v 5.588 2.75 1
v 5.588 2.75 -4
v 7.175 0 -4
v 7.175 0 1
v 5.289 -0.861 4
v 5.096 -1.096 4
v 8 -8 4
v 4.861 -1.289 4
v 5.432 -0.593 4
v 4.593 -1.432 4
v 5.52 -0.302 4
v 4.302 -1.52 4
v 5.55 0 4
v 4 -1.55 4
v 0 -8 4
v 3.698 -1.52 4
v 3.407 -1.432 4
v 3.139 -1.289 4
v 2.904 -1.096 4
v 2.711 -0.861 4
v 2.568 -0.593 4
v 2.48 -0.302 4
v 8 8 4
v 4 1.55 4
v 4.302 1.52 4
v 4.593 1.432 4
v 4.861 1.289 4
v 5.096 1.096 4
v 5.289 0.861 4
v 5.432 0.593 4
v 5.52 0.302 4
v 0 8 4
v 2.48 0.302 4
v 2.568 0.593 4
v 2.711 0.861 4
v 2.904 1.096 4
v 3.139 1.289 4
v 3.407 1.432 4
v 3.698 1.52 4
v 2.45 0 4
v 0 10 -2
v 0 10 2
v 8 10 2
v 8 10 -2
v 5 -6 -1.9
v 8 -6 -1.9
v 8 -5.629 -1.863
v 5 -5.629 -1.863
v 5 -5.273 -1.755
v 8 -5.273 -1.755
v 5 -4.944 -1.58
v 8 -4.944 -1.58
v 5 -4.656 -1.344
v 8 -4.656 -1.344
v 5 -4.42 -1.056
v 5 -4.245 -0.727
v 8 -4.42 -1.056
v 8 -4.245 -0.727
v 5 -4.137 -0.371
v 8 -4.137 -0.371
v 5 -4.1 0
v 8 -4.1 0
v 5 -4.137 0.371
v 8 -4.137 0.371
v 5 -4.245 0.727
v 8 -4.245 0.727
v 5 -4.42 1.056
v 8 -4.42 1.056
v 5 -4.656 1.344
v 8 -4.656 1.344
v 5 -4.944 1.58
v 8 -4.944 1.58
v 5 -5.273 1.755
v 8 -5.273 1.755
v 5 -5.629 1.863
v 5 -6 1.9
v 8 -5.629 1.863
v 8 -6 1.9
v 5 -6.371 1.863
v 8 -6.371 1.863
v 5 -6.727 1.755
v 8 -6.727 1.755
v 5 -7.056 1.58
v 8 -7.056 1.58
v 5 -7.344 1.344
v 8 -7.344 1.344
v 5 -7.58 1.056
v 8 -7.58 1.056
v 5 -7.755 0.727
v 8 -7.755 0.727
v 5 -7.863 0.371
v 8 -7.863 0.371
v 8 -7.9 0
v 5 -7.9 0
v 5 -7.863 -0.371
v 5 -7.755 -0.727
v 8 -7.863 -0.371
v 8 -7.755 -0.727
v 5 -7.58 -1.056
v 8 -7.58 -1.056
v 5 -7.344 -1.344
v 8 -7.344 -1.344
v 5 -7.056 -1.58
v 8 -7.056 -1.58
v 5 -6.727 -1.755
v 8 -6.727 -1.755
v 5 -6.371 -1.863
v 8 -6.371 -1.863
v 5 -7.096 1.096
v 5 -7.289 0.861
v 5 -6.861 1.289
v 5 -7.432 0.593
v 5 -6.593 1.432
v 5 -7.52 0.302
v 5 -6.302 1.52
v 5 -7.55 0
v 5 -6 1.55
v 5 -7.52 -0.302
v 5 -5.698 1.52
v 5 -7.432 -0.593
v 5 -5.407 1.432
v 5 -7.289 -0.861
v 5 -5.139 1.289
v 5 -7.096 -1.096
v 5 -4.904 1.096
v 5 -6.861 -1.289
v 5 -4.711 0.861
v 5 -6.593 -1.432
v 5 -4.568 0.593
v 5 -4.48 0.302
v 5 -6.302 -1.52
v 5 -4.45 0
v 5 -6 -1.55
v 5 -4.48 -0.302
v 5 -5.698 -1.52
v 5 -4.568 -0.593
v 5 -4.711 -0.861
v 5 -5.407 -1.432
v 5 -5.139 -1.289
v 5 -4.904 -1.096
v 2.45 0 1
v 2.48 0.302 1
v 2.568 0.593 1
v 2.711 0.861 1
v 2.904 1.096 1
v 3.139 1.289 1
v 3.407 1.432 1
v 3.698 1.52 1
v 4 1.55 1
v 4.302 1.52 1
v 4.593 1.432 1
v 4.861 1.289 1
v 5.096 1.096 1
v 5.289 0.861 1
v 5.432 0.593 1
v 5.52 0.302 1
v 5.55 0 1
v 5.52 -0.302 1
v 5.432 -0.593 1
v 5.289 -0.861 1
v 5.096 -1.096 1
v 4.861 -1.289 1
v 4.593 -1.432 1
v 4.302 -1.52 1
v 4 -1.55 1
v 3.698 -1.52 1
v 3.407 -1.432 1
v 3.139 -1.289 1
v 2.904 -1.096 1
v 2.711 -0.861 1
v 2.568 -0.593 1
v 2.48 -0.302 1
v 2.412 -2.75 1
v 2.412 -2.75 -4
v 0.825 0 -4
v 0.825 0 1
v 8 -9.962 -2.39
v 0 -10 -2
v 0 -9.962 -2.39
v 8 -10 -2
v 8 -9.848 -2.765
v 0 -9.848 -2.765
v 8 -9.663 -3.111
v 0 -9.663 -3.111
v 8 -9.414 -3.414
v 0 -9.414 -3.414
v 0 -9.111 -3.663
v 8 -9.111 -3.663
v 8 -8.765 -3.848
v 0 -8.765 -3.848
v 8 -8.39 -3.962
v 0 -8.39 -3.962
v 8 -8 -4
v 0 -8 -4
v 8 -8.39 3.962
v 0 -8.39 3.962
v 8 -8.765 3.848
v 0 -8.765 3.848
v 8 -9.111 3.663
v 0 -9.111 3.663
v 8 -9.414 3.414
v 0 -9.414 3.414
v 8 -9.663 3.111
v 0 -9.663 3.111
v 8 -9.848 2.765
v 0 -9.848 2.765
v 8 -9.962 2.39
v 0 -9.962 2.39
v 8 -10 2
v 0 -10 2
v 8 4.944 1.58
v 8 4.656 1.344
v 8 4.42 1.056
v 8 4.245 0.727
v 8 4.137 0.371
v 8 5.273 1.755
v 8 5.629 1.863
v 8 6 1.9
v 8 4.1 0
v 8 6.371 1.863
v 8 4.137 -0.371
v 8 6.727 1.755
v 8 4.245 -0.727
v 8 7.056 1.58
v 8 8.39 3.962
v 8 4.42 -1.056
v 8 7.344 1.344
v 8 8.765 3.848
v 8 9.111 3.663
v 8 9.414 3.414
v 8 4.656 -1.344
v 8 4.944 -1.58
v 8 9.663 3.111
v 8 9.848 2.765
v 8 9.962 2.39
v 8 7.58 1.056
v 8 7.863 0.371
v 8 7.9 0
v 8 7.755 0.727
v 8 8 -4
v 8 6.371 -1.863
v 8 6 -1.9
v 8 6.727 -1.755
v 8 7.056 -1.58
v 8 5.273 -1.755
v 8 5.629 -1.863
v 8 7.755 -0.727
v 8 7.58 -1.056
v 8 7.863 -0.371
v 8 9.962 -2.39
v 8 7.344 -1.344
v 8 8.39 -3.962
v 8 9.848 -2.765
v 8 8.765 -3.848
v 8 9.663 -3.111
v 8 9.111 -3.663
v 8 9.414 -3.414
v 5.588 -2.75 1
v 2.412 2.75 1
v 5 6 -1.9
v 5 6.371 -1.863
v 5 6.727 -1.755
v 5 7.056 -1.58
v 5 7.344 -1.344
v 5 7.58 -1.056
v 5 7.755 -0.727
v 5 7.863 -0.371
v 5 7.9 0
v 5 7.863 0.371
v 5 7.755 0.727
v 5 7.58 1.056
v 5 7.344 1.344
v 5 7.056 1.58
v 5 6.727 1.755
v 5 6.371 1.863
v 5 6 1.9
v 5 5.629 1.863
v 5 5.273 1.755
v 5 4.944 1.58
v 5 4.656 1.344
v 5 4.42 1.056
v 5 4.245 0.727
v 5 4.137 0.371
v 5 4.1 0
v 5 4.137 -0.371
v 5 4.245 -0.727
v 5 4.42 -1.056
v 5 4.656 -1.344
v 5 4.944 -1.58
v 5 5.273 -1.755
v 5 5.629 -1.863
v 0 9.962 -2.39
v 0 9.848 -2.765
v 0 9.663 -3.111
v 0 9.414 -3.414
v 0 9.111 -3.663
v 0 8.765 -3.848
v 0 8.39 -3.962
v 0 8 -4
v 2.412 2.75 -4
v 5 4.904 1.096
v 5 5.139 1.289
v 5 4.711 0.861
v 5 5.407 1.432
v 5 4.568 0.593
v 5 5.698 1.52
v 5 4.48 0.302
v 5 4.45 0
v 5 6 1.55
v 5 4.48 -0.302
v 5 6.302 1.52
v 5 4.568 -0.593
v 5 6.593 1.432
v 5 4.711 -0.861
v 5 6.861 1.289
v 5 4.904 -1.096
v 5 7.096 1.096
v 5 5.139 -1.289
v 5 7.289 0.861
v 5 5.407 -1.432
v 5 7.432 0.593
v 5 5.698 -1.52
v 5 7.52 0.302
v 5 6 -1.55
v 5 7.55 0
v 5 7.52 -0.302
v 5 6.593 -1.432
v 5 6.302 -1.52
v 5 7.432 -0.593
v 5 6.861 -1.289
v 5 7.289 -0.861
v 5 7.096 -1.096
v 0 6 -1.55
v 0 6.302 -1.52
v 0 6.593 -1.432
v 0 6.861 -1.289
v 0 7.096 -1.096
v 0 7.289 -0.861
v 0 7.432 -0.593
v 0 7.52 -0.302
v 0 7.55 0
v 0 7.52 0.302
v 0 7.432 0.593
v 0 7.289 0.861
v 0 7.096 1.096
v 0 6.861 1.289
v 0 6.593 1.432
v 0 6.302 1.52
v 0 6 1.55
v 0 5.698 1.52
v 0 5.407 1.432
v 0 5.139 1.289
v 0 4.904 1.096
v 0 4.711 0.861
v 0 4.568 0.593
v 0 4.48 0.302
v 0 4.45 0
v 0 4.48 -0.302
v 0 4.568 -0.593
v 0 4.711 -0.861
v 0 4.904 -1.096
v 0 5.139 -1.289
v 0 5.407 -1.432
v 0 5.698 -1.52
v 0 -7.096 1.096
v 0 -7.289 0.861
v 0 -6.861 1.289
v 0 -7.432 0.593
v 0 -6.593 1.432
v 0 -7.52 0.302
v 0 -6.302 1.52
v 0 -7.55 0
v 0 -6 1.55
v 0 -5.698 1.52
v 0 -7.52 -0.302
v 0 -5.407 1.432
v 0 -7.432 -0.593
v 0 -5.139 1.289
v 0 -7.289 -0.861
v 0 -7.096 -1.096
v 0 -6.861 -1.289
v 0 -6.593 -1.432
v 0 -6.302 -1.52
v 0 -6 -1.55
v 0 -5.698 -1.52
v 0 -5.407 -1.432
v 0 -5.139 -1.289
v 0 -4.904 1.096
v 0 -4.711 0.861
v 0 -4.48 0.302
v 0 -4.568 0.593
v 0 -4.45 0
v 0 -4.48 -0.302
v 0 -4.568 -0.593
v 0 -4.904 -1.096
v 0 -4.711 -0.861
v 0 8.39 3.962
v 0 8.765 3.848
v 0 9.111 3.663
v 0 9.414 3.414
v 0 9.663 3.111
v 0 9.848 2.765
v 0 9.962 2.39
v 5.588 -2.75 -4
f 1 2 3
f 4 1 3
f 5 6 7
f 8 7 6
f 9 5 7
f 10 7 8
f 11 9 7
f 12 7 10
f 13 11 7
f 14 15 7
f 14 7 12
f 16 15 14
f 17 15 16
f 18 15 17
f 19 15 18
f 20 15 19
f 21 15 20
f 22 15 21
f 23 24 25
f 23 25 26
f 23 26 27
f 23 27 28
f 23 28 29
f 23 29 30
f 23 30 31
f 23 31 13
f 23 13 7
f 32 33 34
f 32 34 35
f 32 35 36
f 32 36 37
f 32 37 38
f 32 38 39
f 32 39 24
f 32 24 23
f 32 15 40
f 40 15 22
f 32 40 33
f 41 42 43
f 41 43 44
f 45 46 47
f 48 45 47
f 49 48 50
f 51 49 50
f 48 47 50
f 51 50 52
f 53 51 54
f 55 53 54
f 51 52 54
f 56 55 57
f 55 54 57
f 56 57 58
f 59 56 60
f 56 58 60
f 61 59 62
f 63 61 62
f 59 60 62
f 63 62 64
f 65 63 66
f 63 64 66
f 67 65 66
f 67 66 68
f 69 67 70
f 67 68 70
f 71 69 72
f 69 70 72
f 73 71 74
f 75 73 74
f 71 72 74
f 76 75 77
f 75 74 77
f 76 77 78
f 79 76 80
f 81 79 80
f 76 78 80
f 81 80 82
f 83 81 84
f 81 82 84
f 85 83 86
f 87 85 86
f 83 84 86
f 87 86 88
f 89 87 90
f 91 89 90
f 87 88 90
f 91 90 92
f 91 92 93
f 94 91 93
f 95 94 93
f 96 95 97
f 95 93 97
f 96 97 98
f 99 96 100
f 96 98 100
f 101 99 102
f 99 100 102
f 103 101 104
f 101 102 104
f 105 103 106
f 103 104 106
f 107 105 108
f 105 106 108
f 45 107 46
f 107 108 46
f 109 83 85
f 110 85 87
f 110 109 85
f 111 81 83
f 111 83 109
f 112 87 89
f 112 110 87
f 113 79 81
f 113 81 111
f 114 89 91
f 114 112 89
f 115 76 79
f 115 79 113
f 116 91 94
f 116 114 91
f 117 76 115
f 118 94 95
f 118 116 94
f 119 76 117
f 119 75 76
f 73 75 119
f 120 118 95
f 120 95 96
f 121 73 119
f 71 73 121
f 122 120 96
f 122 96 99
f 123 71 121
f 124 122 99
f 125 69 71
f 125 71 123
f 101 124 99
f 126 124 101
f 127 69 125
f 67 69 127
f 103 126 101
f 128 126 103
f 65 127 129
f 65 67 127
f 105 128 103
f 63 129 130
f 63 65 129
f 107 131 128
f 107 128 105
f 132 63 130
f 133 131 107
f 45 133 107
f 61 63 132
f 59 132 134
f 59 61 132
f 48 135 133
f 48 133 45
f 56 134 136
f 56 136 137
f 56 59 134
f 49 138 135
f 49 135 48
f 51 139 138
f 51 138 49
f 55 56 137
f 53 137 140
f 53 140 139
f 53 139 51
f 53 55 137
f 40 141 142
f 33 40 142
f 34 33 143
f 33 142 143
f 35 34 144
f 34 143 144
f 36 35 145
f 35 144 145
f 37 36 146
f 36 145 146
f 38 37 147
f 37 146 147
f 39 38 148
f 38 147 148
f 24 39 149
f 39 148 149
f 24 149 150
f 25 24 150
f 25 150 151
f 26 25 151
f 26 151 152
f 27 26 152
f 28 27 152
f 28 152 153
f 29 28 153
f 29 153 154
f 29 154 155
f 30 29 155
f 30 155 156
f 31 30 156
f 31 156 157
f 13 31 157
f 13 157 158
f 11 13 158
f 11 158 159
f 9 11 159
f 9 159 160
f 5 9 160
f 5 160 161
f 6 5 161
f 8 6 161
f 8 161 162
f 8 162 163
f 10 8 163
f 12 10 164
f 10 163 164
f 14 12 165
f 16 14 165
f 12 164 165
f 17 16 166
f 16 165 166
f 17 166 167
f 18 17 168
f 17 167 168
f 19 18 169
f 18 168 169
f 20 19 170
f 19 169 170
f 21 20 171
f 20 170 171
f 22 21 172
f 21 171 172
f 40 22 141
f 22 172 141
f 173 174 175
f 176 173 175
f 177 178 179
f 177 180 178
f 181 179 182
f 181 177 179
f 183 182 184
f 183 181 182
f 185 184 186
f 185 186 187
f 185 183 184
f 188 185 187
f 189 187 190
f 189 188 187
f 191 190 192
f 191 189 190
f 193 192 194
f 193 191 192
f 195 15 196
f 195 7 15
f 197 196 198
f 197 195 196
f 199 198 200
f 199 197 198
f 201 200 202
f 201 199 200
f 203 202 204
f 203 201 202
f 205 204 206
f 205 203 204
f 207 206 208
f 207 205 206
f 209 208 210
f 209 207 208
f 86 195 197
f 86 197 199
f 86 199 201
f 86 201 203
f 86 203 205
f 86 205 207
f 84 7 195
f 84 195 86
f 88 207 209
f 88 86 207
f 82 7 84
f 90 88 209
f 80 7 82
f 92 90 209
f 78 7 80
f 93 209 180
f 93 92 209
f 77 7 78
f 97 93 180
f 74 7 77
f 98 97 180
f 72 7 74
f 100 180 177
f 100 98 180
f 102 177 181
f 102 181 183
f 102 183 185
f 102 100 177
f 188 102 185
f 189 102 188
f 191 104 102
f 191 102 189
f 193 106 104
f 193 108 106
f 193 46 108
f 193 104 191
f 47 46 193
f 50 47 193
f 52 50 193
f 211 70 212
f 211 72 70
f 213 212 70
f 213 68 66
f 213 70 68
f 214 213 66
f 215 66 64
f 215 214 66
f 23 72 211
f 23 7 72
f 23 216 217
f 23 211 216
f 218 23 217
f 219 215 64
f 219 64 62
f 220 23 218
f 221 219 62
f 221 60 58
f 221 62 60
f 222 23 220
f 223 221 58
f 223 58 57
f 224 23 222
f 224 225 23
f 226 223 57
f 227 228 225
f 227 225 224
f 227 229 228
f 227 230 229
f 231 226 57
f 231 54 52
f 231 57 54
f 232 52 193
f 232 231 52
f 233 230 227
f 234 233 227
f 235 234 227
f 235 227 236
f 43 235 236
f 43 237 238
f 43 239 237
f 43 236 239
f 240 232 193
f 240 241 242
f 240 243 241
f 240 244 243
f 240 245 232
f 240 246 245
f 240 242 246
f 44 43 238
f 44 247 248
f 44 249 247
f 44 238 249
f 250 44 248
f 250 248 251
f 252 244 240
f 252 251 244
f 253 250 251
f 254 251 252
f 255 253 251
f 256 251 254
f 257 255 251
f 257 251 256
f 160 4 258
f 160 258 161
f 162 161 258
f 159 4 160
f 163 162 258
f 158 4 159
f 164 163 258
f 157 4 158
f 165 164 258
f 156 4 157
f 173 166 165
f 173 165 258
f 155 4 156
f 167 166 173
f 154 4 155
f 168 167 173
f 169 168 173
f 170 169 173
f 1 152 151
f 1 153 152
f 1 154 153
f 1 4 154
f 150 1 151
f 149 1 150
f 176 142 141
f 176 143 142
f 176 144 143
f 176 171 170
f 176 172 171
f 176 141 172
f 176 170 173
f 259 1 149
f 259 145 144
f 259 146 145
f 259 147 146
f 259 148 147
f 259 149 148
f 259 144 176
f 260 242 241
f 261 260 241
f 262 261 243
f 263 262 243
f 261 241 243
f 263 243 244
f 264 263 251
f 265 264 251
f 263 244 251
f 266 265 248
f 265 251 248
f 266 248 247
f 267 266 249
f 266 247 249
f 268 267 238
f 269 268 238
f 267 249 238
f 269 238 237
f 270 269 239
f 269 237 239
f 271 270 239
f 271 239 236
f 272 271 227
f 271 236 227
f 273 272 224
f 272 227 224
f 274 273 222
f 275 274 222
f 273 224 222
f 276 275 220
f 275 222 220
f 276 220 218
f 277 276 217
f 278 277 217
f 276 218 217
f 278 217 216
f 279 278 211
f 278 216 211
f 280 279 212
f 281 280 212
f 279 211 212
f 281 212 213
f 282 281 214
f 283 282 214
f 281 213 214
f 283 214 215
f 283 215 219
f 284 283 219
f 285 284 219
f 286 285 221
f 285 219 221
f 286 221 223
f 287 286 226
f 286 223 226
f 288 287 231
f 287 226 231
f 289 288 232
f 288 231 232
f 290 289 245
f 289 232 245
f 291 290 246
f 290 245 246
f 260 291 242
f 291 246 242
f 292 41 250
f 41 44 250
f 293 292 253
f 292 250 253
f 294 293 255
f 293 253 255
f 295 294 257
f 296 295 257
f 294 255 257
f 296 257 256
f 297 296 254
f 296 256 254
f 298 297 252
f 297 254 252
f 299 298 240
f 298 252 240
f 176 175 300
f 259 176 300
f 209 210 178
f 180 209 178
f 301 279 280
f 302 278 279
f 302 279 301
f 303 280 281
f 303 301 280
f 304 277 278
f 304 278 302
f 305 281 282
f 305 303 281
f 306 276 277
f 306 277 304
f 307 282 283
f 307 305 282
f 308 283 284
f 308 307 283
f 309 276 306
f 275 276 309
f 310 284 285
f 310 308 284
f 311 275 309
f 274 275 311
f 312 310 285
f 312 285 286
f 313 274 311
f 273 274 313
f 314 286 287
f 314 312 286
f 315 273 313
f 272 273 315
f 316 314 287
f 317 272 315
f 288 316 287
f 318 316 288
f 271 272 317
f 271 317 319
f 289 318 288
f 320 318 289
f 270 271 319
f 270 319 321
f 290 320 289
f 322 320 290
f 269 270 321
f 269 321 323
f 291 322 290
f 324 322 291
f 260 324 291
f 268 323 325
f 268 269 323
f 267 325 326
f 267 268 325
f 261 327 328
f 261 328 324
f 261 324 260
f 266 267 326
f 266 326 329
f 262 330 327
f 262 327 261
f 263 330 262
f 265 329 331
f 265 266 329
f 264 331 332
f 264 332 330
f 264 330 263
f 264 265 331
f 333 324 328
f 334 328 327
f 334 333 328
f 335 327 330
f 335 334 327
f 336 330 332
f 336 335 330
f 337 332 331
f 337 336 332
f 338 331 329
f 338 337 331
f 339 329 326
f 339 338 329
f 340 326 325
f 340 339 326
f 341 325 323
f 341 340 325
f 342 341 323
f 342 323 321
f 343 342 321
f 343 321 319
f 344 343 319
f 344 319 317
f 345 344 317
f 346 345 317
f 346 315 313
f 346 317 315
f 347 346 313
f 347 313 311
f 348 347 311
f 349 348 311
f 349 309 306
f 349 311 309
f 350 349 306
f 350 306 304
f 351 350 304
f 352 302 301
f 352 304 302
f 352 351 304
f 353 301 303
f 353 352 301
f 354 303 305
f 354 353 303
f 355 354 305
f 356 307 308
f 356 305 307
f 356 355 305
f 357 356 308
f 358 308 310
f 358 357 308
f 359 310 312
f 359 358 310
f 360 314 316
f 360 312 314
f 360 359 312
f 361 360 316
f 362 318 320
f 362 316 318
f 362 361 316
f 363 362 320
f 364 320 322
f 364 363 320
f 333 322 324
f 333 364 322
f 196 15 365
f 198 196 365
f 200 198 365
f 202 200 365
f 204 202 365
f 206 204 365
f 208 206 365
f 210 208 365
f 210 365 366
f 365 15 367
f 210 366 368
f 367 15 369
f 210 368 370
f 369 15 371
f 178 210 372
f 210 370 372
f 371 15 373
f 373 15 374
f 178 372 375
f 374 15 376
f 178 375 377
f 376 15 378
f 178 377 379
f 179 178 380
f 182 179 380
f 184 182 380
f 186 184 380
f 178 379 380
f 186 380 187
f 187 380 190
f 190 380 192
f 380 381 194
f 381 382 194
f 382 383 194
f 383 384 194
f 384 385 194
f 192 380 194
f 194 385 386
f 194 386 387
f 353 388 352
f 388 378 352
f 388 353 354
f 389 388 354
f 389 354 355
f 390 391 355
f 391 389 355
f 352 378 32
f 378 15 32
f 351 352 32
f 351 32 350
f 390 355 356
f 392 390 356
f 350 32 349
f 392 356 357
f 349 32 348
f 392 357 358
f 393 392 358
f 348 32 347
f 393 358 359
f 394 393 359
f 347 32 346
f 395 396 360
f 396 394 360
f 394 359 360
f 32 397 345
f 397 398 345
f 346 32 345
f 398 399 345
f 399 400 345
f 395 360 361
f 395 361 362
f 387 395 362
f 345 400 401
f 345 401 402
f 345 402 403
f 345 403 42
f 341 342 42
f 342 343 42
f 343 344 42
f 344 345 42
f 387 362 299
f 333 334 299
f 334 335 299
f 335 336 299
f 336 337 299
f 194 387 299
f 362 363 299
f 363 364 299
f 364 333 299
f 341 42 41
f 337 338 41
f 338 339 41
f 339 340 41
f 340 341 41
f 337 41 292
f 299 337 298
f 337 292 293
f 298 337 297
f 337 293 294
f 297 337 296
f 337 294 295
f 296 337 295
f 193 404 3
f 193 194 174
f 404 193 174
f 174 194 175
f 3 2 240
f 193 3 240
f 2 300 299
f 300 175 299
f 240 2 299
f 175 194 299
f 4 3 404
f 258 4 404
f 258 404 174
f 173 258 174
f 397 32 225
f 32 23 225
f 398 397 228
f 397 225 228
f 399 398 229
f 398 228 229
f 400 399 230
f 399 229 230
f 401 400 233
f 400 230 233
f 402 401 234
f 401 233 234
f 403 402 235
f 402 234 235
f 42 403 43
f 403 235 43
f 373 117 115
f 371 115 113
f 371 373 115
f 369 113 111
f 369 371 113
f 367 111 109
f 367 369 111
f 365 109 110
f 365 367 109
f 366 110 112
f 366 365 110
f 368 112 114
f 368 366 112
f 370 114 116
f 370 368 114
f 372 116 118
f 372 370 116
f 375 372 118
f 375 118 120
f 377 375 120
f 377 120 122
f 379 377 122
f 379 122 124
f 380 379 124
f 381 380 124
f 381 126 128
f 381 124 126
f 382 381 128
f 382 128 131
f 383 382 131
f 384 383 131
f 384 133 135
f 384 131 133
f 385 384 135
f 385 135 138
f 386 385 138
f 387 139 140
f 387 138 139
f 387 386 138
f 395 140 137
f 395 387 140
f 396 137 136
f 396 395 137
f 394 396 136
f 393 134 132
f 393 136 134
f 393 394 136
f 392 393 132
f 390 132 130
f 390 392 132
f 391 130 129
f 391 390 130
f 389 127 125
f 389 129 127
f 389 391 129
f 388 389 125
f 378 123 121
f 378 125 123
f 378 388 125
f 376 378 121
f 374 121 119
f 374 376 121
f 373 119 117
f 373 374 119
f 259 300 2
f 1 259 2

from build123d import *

# Parameters (mm, degrees)
ESQUISSE1_W             = 8
ESQUISSE1_H             = 20
ESQUISSE1_R             = 1.55
BOSS_EXTRU_1_DEPTH      = 8
ESQUISSE2_R             = 1.55
ENL_V_MAT_EXTRU_1_DEPTH = 16.099668871
ESQUISSE3_R             = 1.9
ENL_V_MAT_EXTRU_2_DEPTH = 3
ENL_V_MAT_EXTRU_3_DEPTH = 5
CONG_1_R                = 2


with BuildPart() as part:
    # Esquisse1 → Boss.-Extru.1 (new body)
    with BuildSketch(Plane(origin=(0, 0, 0), x_dir=(0, 0, -1), z_dir=(1, 0, 0))):
        Rectangle(ESQUISSE1_W, ESQUISSE1_H)
        with Locations((0, 6)):
            Circle(ESQUISSE1_R, mode=Mode.SUBTRACT)
        with Locations(Location((0, -6, 0), (0, 0, 180))):
            Circle(ESQUISSE1_R, mode=Mode.SUBTRACT)
    extrude(amount=BOSS_EXTRU_1_DEPTH)

    # Esquisse2 → Enlèv. mat.-Extru.1 (cut, through all)
    with BuildSketch(Plane(origin=(0, 0, -4), x_dir=(-1, 0, 0), z_dir=(0, 0, -1))):
        with Locations((-4, 0)):
            Circle(ESQUISSE2_R)
    extrude(amount=-ENL_V_MAT_EXTRU_1_DEPTH, mode=Mode.SUBTRACT)

    # Esquisse3 → Enlèv. mat.-Extru.2 (cut)
    with BuildSketch(Plane(origin=(8, 0, 0), x_dir=(0, 0, -1), z_dir=(1, 0, 0))):
        with Locations((0, 6)):
            Circle(ESQUISSE3_R)
        with Locations((0, -6)):
            Circle(ESQUISSE3_R)
    extrude(amount=-ENL_V_MAT_EXTRU_2_DEPTH, mode=Mode.SUBTRACT)

    # Esquisse4 → Enlèv. mat.-Extru.3 (cut)
    with BuildSketch(Plane(origin=(0, 0, -4), x_dir=(-1, 0, 0), z_dir=(0, 0, -1))):
        Polygon((-5.58771324, 2.75), (-7.175426481, 0), (-5.58771324, -2.75), (-2.41228676, -2.75), (-0.824573519, 0), (-2.41228676, 2.75), align=None)
    extrude(amount=-ENL_V_MAT_EXTRU_3_DEPTH, mode=Mode.SUBTRACT)

    # Congé1
    cong_1_edges = [part.edges().sort_by_distance(p)[0] for p in [
        (4, -10, -4),
        (4, -10, 4),
        (4, 10, 4),
        (4, 10, -4),
    ]]
    fillet(cong_1_edges, radius=CONG_1_R)


solid = part.part
